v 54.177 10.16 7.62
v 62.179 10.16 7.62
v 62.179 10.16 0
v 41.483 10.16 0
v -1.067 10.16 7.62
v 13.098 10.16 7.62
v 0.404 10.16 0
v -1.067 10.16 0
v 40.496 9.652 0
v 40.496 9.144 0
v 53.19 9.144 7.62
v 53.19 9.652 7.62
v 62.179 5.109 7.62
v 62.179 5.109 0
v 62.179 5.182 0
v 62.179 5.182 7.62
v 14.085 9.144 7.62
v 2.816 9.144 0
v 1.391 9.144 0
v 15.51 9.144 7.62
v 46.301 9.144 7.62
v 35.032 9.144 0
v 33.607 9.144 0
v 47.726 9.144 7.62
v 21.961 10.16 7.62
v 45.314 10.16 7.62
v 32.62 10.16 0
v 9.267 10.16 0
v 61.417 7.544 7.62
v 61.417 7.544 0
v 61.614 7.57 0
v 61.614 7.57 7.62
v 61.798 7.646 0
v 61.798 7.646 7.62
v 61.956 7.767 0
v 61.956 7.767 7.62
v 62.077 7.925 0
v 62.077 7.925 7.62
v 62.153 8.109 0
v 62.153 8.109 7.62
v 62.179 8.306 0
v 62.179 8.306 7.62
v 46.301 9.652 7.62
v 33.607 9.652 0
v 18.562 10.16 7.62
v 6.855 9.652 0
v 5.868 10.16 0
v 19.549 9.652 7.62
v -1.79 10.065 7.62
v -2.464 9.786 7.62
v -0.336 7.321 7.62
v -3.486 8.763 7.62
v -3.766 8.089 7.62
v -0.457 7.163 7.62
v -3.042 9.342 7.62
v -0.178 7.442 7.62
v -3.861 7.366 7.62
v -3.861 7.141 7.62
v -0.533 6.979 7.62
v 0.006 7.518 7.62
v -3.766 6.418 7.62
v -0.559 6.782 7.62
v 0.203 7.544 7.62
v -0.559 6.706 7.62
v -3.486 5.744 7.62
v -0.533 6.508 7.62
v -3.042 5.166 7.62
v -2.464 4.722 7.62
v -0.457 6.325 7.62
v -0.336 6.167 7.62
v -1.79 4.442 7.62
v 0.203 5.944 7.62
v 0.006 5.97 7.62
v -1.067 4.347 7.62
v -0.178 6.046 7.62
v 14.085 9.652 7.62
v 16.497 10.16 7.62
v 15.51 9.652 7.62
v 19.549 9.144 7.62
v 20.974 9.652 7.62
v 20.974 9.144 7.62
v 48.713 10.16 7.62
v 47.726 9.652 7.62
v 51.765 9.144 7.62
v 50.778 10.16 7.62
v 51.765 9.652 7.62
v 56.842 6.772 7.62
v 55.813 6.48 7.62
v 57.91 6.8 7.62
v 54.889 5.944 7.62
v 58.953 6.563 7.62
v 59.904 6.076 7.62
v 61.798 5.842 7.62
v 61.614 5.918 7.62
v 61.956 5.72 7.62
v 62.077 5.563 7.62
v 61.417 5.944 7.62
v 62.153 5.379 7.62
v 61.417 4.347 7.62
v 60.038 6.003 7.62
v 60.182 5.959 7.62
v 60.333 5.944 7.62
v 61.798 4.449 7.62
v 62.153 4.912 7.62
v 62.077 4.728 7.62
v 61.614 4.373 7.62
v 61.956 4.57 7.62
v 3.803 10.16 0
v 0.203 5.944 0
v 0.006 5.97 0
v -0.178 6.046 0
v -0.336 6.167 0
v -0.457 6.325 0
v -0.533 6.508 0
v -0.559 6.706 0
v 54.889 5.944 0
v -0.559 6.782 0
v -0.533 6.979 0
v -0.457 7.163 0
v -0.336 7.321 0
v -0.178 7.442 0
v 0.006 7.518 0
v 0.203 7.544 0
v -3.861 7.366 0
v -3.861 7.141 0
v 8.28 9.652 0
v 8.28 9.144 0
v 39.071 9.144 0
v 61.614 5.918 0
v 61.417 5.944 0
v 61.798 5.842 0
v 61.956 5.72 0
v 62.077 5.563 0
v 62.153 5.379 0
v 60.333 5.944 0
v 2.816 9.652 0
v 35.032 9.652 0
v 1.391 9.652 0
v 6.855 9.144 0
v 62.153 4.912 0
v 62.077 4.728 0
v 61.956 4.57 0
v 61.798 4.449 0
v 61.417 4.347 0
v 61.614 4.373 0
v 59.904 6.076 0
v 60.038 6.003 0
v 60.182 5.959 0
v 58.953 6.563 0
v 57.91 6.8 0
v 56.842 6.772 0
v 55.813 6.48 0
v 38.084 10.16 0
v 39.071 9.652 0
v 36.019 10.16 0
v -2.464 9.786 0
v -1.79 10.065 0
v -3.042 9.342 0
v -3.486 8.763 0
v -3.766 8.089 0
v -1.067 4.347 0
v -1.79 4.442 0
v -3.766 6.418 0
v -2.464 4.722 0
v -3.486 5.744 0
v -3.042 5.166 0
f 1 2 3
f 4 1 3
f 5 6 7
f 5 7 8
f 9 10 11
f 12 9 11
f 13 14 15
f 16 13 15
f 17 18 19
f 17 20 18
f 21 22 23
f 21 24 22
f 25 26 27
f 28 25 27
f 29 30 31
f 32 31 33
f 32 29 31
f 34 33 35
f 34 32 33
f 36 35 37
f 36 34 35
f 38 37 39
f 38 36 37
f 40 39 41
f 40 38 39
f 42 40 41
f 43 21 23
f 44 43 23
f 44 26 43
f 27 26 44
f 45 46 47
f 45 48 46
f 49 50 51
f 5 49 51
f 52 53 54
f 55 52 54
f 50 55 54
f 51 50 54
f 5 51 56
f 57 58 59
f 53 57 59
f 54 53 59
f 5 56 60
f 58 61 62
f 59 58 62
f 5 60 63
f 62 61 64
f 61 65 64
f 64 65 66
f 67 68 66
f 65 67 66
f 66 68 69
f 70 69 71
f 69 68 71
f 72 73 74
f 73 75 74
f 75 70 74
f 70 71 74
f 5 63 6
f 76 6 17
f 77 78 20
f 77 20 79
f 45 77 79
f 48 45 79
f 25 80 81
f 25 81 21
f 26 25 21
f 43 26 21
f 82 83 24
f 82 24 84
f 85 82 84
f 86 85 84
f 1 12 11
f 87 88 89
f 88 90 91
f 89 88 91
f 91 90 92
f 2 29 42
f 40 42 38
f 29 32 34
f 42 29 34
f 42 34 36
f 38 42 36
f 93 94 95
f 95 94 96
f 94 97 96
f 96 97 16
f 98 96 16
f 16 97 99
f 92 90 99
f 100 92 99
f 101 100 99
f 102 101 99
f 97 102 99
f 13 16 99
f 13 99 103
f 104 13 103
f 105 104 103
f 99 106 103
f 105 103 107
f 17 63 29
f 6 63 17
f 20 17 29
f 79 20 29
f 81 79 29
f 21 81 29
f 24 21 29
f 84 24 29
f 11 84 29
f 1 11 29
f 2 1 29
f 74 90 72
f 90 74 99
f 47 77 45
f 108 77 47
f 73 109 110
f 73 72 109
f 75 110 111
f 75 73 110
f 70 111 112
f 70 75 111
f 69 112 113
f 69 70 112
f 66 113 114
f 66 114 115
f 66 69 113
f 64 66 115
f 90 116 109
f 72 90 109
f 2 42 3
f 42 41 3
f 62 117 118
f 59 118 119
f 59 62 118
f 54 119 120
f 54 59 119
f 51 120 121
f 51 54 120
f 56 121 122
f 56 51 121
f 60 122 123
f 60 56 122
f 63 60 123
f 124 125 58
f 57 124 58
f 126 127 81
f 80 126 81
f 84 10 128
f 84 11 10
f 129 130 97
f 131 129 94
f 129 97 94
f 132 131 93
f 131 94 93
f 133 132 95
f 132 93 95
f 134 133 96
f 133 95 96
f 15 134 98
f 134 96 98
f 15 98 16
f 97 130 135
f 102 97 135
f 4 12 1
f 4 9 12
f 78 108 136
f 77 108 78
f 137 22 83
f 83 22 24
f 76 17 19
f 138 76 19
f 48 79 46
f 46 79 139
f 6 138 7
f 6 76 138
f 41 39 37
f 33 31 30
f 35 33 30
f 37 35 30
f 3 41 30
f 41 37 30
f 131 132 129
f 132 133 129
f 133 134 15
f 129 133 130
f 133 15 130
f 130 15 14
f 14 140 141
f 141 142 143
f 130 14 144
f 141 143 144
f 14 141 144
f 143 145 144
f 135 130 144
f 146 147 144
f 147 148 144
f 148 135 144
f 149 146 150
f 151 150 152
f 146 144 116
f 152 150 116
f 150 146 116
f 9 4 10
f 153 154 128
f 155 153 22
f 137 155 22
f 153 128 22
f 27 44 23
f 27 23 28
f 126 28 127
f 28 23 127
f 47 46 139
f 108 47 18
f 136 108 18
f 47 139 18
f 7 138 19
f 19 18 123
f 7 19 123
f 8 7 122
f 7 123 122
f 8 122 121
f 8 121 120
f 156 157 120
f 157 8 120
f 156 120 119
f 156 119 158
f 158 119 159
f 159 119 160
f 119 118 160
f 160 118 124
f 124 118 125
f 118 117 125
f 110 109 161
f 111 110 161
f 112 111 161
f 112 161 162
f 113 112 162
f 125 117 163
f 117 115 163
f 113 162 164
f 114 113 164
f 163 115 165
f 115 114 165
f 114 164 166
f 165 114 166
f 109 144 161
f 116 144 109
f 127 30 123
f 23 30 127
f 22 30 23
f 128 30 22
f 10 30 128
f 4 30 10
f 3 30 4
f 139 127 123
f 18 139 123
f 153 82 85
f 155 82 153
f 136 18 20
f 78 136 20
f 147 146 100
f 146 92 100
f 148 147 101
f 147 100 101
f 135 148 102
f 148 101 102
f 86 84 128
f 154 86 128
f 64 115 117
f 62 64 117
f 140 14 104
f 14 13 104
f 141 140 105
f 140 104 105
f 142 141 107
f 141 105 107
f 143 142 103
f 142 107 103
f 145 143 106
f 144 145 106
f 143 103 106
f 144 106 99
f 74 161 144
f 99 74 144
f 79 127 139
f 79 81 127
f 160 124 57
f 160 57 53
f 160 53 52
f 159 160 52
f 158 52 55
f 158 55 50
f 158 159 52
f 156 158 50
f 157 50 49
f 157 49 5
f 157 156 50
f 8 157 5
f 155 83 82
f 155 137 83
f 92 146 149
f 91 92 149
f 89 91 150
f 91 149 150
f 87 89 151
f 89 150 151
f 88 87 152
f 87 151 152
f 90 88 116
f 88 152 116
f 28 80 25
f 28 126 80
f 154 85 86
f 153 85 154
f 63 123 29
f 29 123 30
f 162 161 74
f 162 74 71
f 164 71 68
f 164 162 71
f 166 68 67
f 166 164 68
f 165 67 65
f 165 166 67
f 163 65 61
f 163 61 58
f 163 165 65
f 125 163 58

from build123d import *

# Parameters (mm, degrees)
F1_DEPTH    = 7.62
F3_DEPTH    = 1.016
F4_T1_DEPTH = 21.59
F5_R        = 0.762
F6_R        = 0.762
F7_SIZE     = 0.508


# Not quite as in the source:
# - a fillet or chamfer that OpenCascade refuses, or shapes differently, is made with other operations: its cross-section is extruded or revolved along the edge and cut away or added


with BuildPart() as f1:
    # F0 (on Top) → F1 (new body)
    with BuildSketch(Plane.XY):
        with BuildLine():
            Line((62.1792, 9.144), (-3.8608, 9.144))
            Line((-3.8608, 9.144), (-3.8608, 4.3472210688))
            Line((-3.8608, 4.3472210688), (62.1792, 4.3472210688))
            Line((62.1792, 4.3472210688), (62.1792, 5.9436))
            Line((62.1792, 5.9436), (60.087851236, 5.9436))
            ThreePointArc((60.087851236, 5.9436), (57.4883669615, 6.8209325844), (54.888882687, 5.9436))
            Line((54.888882687, 5.9436), (-0.5588, 5.9436))
            Line((-0.5588, 5.9436), (-0.5588, 7.5438))
            Line((-0.5588, 7.5438), (62.1792, 7.5438))
            Line((62.1792, 7.5438), (62.1792, 9.144))
        make_face()
    extrude(amount=F1_DEPTH)

    # F2 (on face) → F3 (join)
    with BuildSketch(Plane(origin=(0, 9.144, 0), x_dir=(-1, 0, 0), z_dir=(0, 1, 0))):
        Polygon((-14.0853170305, 7.62), (-1.3910392299, 0), (3.8608, 0), (3.8608, 7.62), align=None)
        Polygon((-19.5489563048, 7.62), (-6.8546785042, 0), (-2.8160745278, 0), (-15.5103523284, 7.62), align=None)
        Polygon((-33.6069809273, 0), (-8.279713802, 0), (-20.9739916027, 7.62), (-46.3012587279, 7.62), align=None)
        Polygon((-39.0706202015, 0), (-35.0320162252, 0), (-47.7262940258, 7.62), (-51.7648980021, 7.62), align=None)
        Polygon((-62.1792, 0), (-40.4956554994, 0), (-53.1899333, 7.62), (-62.1792, 7.62), align=None)
    extrude(amount=F3_DEPTH)

    # F4: fillet of radius 2.794 on 3 edges, made by hand

    # F4_s2 → F4_t1 (cut)
    with BuildSketch(Plane.XY.offset(-6.985)):
        with BuildLine():
            ThreePointArc((-1.0668, 4.3472210688), (-3.0424563466, 5.1655647222), (-3.8608, 7.1412210688))
            Line((-3.8608, 7.1412210688), (-3.8608, 4.3472210688))
            Line((-3.8608, 4.3472210688), (-1.0668, 4.3472210688))
        make_face()
        with BuildLine():
            ThreePointArc((-3.8608, 7.366), (-3.0424563466, 9.3416563466), (-1.0668, 10.16))
            Line((-1.0668, 10.16), (-3.8608, 10.16))
            Line((-3.8608, 10.16), (-3.8608, 7.366))
        make_face()
    extrude(amount=F4_T1_DEPTH, mode=Mode.SUBTRACT)

    # F5
    f5_edges = [f1.edges().sort_by_distance(p)[0] for p in [
        (-0.5588, 5.9436, 3.81),
        (-0.5588, 7.5438, 3.81),
    ]]
    fillet(f5_edges, radius=F5_R)

    # F6
    f6_edges = [f1.edges().sort_by_distance(p)[0] for p in [
        (62.1792, 7.5438, 3.81),
        (60.087851, 5.9436, 3.81),
        (62.1792, 5.9436, 3.81),
        (62.1792, 4.347221, 3.81),
    ]]
    fillet(f6_edges, radius=F6_R)

    # F7
    f7_edges = [f1.edges().sort_by_distance(p)[0] for p in [
        (7.738178, 10.16, 3.81),
        (9.163213, 10.16, 3.81),
        (13.201817, 10.16, 3.81),
        (14.626853, 10.16, 3.81),
        (39.95412, 10.16, 3.81),
        (41.379155, 10.16, 3.81),
        (45.417759, 10.16, 3.81),
        (46.842794, 10.16, 3.81),
    ]]
    chamfer(f7_edges, length=F7_SIZE)


solid = f1.part
